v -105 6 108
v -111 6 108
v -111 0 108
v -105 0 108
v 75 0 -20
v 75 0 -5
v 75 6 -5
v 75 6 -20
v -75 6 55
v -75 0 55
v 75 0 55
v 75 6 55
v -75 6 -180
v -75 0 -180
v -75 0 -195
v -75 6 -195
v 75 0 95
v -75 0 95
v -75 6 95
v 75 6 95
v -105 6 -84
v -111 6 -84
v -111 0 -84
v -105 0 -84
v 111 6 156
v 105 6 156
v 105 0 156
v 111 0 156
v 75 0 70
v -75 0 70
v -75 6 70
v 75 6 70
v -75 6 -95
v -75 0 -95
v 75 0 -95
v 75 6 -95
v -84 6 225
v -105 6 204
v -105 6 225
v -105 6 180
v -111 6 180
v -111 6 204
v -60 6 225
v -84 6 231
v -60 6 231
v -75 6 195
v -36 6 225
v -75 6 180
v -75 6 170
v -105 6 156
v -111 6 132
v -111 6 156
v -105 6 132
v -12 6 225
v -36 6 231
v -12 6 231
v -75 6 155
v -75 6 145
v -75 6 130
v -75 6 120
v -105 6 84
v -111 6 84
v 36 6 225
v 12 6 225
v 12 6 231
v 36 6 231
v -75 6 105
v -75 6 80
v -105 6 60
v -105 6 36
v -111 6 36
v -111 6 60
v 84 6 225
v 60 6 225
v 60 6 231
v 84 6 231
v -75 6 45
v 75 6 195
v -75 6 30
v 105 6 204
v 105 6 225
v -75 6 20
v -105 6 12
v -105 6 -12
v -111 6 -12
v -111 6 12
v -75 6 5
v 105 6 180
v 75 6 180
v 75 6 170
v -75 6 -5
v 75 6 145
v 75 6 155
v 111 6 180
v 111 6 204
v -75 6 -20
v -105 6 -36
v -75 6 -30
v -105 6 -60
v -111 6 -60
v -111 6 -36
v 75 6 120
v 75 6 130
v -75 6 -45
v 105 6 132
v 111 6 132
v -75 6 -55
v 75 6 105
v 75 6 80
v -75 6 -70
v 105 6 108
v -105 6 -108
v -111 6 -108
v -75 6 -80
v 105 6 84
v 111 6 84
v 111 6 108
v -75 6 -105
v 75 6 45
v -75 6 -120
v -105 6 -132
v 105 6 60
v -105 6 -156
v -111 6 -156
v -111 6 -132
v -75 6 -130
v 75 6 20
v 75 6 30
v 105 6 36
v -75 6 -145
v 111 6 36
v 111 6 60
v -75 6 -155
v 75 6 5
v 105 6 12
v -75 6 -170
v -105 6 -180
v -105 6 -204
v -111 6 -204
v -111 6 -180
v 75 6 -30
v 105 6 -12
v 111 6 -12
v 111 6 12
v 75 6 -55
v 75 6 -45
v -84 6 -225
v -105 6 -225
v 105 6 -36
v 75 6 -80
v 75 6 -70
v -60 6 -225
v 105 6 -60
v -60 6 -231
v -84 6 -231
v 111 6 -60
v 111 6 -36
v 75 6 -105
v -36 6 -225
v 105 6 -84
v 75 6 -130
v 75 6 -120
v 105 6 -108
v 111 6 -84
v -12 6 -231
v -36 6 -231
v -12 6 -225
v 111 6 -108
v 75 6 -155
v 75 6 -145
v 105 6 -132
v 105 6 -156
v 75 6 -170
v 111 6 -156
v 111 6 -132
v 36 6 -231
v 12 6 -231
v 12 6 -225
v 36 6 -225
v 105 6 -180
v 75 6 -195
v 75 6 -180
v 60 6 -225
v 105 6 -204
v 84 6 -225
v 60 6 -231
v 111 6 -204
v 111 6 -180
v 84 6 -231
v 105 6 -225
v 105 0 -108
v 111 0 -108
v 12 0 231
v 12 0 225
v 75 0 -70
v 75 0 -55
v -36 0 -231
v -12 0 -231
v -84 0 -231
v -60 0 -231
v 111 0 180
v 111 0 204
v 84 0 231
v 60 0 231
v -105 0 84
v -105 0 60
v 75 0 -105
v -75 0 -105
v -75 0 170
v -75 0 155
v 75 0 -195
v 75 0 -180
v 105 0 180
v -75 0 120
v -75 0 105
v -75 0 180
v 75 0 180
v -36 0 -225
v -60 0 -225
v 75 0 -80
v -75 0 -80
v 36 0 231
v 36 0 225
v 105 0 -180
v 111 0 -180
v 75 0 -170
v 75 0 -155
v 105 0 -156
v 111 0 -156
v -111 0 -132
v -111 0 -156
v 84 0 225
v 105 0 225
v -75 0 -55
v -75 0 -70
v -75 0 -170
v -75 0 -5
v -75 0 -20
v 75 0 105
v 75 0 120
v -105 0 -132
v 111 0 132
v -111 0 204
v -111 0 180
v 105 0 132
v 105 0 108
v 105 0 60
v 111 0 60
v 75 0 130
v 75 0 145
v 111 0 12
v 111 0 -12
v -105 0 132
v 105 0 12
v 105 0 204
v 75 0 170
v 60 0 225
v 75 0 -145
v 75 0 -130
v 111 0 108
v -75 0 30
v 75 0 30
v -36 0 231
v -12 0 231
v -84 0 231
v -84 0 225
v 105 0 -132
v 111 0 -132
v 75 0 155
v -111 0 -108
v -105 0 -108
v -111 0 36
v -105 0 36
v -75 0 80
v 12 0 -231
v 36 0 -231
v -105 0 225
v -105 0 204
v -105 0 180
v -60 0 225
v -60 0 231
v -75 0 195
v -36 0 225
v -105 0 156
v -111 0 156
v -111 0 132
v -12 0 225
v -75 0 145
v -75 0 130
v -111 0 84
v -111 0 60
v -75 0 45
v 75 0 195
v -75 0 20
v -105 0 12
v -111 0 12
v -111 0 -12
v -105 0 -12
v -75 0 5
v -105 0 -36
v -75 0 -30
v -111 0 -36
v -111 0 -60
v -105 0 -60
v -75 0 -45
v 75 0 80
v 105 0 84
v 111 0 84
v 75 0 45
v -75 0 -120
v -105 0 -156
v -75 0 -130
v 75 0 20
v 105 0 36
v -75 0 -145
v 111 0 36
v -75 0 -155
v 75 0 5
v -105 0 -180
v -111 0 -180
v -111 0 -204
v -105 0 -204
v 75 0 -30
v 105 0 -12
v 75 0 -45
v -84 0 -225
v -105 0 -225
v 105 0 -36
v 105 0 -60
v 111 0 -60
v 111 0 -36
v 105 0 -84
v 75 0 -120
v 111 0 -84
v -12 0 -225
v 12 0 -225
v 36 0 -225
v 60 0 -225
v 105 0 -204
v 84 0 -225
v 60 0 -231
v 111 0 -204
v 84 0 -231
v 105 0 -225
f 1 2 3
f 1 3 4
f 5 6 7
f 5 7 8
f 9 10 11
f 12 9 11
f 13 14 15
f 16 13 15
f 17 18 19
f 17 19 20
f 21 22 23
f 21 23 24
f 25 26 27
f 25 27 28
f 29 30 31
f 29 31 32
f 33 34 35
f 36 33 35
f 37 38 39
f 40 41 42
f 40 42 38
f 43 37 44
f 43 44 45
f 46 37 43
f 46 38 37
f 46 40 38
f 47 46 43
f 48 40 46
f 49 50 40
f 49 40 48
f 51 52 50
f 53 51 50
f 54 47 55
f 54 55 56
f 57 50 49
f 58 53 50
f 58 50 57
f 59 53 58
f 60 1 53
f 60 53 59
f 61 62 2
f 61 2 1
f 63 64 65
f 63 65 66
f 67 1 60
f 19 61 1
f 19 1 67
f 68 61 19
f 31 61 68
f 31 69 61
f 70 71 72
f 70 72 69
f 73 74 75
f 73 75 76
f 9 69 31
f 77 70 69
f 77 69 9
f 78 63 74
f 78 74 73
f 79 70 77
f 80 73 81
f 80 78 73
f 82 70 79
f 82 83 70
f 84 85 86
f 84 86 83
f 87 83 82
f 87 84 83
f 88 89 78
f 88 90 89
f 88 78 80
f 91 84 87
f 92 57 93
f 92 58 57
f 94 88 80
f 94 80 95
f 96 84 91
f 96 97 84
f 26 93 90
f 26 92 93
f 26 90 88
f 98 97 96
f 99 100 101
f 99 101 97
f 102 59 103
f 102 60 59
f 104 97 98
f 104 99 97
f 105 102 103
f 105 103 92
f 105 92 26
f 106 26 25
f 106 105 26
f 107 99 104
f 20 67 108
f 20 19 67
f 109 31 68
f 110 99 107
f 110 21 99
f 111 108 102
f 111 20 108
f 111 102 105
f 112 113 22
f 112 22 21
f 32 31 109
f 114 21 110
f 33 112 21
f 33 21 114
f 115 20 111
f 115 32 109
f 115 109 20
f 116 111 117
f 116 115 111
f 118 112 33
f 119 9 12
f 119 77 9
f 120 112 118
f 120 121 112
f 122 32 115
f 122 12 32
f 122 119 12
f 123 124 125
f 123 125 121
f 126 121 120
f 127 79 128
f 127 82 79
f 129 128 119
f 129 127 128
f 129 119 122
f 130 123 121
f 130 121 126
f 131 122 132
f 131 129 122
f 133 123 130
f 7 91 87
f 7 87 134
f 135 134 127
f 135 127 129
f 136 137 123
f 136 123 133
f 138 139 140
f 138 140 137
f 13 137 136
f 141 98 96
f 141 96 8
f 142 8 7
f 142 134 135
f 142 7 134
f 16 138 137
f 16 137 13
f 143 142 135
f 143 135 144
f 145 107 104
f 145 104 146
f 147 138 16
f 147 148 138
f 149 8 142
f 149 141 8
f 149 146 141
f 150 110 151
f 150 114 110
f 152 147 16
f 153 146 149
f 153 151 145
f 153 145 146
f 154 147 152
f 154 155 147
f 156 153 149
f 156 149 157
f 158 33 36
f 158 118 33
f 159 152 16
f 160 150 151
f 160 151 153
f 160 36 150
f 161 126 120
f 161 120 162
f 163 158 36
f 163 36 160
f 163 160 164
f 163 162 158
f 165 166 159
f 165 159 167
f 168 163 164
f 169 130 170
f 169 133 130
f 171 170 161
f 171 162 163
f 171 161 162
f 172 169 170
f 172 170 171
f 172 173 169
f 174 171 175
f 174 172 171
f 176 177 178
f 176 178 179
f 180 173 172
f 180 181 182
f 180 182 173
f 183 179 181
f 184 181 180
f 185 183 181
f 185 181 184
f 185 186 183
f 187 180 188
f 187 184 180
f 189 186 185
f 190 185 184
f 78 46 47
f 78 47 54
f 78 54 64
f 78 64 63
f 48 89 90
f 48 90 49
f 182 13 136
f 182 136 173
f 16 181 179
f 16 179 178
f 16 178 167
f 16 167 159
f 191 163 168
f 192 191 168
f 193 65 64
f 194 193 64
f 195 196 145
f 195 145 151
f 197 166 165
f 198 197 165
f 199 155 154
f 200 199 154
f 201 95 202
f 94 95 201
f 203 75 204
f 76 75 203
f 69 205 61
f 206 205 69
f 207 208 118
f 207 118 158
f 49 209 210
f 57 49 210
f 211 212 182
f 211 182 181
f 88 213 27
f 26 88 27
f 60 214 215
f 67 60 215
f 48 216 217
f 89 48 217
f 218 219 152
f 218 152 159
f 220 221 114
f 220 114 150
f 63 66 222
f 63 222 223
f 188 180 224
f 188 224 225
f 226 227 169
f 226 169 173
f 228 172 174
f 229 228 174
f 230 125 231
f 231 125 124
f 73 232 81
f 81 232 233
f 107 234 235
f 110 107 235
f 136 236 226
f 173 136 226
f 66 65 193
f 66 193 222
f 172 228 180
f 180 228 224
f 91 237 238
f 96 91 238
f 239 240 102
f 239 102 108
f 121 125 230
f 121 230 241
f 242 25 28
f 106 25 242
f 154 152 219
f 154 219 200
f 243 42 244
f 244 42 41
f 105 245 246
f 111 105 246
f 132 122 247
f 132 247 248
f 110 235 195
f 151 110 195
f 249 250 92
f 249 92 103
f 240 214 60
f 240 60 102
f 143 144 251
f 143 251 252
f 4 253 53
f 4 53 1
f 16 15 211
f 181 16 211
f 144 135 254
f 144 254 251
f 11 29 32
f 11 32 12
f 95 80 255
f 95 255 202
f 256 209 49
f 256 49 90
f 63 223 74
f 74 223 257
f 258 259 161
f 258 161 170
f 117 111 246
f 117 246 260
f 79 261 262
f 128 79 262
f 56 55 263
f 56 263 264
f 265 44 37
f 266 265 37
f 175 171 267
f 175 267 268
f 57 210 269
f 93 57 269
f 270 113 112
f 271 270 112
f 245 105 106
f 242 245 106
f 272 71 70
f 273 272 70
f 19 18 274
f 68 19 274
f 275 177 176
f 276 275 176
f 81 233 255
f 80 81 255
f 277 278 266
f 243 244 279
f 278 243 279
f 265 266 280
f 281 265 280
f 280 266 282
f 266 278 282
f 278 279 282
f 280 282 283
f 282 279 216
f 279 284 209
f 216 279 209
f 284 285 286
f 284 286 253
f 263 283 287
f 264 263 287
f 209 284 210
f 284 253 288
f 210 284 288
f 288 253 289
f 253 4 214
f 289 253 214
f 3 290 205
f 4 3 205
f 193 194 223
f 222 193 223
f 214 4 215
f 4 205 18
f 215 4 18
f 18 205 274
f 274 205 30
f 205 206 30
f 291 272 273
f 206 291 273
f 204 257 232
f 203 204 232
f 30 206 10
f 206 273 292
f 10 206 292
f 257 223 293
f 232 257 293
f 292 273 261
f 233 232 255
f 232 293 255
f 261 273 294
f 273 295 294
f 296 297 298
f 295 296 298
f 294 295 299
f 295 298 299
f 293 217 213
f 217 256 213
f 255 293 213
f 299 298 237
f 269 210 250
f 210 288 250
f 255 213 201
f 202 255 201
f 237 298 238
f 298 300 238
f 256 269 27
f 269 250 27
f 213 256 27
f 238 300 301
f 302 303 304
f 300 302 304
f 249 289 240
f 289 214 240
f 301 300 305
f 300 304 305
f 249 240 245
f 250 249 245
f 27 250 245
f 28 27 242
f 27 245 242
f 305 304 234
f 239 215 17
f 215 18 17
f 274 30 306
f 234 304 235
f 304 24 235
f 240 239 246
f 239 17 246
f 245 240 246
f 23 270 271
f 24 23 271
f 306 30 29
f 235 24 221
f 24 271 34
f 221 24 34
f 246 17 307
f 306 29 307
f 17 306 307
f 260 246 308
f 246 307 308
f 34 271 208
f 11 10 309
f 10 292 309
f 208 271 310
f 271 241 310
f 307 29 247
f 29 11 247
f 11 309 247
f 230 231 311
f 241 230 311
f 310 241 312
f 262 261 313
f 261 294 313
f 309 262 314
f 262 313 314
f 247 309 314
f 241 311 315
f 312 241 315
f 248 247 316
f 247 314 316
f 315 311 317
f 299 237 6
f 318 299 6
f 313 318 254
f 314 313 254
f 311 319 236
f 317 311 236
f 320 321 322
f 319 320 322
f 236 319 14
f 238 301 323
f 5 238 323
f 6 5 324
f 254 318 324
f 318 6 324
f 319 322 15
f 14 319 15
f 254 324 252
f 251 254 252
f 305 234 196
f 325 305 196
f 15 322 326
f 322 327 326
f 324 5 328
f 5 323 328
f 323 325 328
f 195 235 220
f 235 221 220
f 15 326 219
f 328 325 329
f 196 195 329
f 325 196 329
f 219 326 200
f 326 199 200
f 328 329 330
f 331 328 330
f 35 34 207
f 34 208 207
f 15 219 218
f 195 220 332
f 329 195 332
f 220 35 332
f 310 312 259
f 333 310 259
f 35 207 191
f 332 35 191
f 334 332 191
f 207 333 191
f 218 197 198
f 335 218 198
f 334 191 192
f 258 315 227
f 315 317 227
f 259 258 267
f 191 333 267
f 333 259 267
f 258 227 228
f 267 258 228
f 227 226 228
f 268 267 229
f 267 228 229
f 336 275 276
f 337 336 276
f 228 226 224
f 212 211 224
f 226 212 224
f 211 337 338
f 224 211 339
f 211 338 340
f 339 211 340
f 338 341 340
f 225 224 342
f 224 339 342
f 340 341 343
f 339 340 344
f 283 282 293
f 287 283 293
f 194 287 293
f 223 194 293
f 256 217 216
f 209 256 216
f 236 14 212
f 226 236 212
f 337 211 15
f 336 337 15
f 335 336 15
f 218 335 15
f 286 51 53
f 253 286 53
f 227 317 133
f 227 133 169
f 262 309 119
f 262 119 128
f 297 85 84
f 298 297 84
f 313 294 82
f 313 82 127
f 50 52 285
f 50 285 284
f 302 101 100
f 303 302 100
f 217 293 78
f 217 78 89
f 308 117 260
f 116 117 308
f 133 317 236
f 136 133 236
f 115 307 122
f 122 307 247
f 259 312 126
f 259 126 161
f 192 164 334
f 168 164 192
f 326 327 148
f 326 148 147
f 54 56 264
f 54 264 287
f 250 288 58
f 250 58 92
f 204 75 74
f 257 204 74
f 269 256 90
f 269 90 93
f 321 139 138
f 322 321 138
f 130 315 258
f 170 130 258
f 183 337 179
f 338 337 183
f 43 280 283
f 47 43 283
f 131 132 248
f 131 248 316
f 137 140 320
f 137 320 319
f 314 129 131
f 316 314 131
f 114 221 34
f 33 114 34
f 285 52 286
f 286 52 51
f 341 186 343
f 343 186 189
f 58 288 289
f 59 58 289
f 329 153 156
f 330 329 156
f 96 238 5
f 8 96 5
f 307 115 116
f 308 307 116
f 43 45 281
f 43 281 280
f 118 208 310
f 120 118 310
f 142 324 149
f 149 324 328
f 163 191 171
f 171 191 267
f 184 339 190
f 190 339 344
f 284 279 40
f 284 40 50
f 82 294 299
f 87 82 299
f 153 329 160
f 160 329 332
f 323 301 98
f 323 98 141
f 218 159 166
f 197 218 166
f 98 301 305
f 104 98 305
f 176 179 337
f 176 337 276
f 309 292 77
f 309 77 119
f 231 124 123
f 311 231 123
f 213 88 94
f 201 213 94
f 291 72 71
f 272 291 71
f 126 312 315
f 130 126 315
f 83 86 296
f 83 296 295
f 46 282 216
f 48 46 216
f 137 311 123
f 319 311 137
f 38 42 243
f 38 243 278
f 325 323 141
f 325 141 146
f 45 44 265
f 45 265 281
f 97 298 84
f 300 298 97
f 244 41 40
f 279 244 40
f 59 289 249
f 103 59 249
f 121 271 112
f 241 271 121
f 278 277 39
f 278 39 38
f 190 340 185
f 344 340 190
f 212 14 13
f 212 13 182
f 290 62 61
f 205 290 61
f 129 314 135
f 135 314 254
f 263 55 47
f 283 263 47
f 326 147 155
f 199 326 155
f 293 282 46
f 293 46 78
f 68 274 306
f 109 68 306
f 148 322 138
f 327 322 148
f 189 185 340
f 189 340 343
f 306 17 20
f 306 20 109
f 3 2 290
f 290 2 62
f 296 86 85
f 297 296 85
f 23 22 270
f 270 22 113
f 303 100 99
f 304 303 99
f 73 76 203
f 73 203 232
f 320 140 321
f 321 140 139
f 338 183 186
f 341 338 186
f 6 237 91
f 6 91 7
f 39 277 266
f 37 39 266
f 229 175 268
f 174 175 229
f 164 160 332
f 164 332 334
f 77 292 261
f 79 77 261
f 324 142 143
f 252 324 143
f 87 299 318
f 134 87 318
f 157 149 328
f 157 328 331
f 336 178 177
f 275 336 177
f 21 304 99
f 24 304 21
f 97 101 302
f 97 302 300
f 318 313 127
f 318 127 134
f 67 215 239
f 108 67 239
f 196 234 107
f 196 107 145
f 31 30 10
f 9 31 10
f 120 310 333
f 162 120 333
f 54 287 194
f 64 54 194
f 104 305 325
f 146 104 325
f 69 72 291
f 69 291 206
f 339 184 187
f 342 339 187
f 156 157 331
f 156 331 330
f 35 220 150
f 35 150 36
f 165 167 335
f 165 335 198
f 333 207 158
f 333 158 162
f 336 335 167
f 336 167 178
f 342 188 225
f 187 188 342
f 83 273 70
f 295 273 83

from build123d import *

# Parameters (mm, degrees)
SKETCH1_W           = 210
SKETCH1_H           = 450
SKETCH1_W_2         = 150
SKETCH1_H_2         = 15
BOSS_EXTRUDE1_DEPTH = 6
SKETCH3_W           = 6
SKETCH3_H           = 24
BOSS_EXTRUDE3_DEPTH = 6
SKETCH2_W           = 24
SKETCH2_H           = 6
BOSS_EXTRUDE4_DEPTH = 6


with BuildPart() as part:
    # Sketch1 → Boss-Extrude1 (new body)
    with BuildSketch(Plane(origin=(0, 0, 0), x_dir=(1, 0, 0), z_dir=(0, 1, 0))):
        Rectangle(SKETCH1_W, SKETCH1_H)
        with Locations((0, -162.5)):
            Rectangle(SKETCH1_W_2, SKETCH1_H_2, mode=Mode.SUBTRACT)
        with Locations((0, -187.5)):
            Rectangle(SKETCH1_W_2, SKETCH1_H_2, mode=Mode.SUBTRACT)
        with Locations((0, -137.5)):
            Rectangle(SKETCH1_W_2, SKETCH1_H_2, mode=Mode.SUBTRACT)
        with Locations((0, -112.5)):
            Rectangle(SKETCH1_W_2, SKETCH1_H_2, mode=Mode.SUBTRACT)
        with Locations((0, -87.5)):
            Rectangle(SKETCH1_W_2, SKETCH1_H_2, mode=Mode.SUBTRACT)
        with Locations((0, -62.5)):
            Rectangle(SKETCH1_W_2, SKETCH1_H_2, mode=Mode.SUBTRACT)
        with Locations((0, -37.5)):
            Rectangle(SKETCH1_W_2, SKETCH1_H_2, mode=Mode.SUBTRACT)
        with Locations((0, -12.5)):
            Rectangle(SKETCH1_W_2, SKETCH1_H_2, mode=Mode.SUBTRACT)
        with Locations((0, 12.5)):
            Rectangle(SKETCH1_W_2, SKETCH1_H_2, mode=Mode.SUBTRACT)
        with Locations((0, 37.5)):
            Rectangle(SKETCH1_W_2, SKETCH1_H_2, mode=Mode.SUBTRACT)
        with Locations((0, 62.5)):
            Rectangle(SKETCH1_W_2, SKETCH1_H_2, mode=Mode.SUBTRACT)
        with Locations((0, 87.5)):
            Rectangle(SKETCH1_W_2, SKETCH1_H_2, mode=Mode.SUBTRACT)
        with Locations((0, 112.5)):
            Rectangle(SKETCH1_W_2, SKETCH1_H_2, mode=Mode.SUBTRACT)
        with Locations((0, 137.5)):
            Rectangle(SKETCH1_W_2, SKETCH1_H_2, mode=Mode.SUBTRACT)
        with Locations((0, 162.5)):
            Rectangle(SKETCH1_W_2, SKETCH1_H_2, mode=Mode.SUBTRACT)
        with Locations((0, 187.5)):
            Rectangle(SKETCH1_W_2, SKETCH1_H_2, mode=Mode.SUBTRACT)
    extrude(amount=BOSS_EXTRUDE1_DEPTH)

    # Sketch3 → Boss-Extrude3 (add)
    with BuildSketch(Plane(origin=(0, 6, 0), x_dir=(1, 0, 0), z_dir=(0, 1, 0))):
        with Locations((-108, 192)):
            Rectangle(SKETCH3_W, SKETCH3_H)
        with Locations((108, 192)):
            Rectangle(SKETCH3_W, SKETCH3_H)
        with Locations((108, 144)):
            Rectangle(SKETCH3_W, SKETCH3_H)
        with Locations((108, 96)):
            Rectangle(SKETCH3_W, SKETCH3_H)
        with Locations((108, 48)):
            Rectangle(SKETCH3_W, SKETCH3_H)
        with Locations((108, 0)):
            Rectangle(SKETCH3_W, SKETCH3_H)
        with Locations((108, -48)):
            Rectangle(SKETCH3_W, SKETCH3_H)
        with Locations((108, -96)):
            Rectangle(SKETCH3_W, SKETCH3_H)
        with Locations((108, -144)):
            Rectangle(SKETCH3_W, SKETCH3_H)
        with Locations((108, -192)):
            Rectangle(SKETCH3_W, SKETCH3_H)
        with Locations((-108, 144)):
            Rectangle(SKETCH3_W, SKETCH3_H)
        with Locations((-108, 96)):
            Rectangle(SKETCH3_W, SKETCH3_H)
        with Locations((-108, 48)):
            Rectangle(SKETCH3_W, SKETCH3_H)
        with Locations((-108, 0)):
            Rectangle(SKETCH3_W, SKETCH3_H)
        with Locations((-108, -48)):
            Rectangle(SKETCH3_W, SKETCH3_H)
        with Locations((-108, -96)):
            Rectangle(SKETCH3_W, SKETCH3_H)
        with Locations((-108, -144)):
            Rectangle(SKETCH3_W, SKETCH3_H)
        with Locations((-108, -192)):
            Rectangle(SKETCH3_W, SKETCH3_H)
    extrude(amount=-BOSS_EXTRUDE3_DEPTH)

    # Sketch2 → Boss-Extrude4 (add)
    with BuildSketch(Plane(origin=(0, 6, 0), x_dir=(1, 0, 0), z_dir=(0, 1, 0))):
        with Locations((-72, 228)):
            Rectangle(SKETCH2_W, SKETCH2_H)
        with Locations((-24, 228)):
            Rectangle(SKETCH2_W, SKETCH2_H)
        with Locations((24, 228)):
            Rectangle(SKETCH2_W, SKETCH2_H)
        with Locations((72, 228)):
            Rectangle(SKETCH2_W, SKETCH2_H)
        with Locations((-72, -228)):
            Rectangle(SKETCH2_W, SKETCH2_H)
        with Locations((-24, -228)):
            Rectangle(SKETCH2_W, SKETCH2_H)
        with Locations((24, -228)):
            Rectangle(SKETCH2_W, SKETCH2_H)
        with Locations((72, -228)):
            Rectangle(SKETCH2_W, SKETCH2_H)
    extrude(amount=-BOSS_EXTRUDE4_DEPTH)


solid = part.part
